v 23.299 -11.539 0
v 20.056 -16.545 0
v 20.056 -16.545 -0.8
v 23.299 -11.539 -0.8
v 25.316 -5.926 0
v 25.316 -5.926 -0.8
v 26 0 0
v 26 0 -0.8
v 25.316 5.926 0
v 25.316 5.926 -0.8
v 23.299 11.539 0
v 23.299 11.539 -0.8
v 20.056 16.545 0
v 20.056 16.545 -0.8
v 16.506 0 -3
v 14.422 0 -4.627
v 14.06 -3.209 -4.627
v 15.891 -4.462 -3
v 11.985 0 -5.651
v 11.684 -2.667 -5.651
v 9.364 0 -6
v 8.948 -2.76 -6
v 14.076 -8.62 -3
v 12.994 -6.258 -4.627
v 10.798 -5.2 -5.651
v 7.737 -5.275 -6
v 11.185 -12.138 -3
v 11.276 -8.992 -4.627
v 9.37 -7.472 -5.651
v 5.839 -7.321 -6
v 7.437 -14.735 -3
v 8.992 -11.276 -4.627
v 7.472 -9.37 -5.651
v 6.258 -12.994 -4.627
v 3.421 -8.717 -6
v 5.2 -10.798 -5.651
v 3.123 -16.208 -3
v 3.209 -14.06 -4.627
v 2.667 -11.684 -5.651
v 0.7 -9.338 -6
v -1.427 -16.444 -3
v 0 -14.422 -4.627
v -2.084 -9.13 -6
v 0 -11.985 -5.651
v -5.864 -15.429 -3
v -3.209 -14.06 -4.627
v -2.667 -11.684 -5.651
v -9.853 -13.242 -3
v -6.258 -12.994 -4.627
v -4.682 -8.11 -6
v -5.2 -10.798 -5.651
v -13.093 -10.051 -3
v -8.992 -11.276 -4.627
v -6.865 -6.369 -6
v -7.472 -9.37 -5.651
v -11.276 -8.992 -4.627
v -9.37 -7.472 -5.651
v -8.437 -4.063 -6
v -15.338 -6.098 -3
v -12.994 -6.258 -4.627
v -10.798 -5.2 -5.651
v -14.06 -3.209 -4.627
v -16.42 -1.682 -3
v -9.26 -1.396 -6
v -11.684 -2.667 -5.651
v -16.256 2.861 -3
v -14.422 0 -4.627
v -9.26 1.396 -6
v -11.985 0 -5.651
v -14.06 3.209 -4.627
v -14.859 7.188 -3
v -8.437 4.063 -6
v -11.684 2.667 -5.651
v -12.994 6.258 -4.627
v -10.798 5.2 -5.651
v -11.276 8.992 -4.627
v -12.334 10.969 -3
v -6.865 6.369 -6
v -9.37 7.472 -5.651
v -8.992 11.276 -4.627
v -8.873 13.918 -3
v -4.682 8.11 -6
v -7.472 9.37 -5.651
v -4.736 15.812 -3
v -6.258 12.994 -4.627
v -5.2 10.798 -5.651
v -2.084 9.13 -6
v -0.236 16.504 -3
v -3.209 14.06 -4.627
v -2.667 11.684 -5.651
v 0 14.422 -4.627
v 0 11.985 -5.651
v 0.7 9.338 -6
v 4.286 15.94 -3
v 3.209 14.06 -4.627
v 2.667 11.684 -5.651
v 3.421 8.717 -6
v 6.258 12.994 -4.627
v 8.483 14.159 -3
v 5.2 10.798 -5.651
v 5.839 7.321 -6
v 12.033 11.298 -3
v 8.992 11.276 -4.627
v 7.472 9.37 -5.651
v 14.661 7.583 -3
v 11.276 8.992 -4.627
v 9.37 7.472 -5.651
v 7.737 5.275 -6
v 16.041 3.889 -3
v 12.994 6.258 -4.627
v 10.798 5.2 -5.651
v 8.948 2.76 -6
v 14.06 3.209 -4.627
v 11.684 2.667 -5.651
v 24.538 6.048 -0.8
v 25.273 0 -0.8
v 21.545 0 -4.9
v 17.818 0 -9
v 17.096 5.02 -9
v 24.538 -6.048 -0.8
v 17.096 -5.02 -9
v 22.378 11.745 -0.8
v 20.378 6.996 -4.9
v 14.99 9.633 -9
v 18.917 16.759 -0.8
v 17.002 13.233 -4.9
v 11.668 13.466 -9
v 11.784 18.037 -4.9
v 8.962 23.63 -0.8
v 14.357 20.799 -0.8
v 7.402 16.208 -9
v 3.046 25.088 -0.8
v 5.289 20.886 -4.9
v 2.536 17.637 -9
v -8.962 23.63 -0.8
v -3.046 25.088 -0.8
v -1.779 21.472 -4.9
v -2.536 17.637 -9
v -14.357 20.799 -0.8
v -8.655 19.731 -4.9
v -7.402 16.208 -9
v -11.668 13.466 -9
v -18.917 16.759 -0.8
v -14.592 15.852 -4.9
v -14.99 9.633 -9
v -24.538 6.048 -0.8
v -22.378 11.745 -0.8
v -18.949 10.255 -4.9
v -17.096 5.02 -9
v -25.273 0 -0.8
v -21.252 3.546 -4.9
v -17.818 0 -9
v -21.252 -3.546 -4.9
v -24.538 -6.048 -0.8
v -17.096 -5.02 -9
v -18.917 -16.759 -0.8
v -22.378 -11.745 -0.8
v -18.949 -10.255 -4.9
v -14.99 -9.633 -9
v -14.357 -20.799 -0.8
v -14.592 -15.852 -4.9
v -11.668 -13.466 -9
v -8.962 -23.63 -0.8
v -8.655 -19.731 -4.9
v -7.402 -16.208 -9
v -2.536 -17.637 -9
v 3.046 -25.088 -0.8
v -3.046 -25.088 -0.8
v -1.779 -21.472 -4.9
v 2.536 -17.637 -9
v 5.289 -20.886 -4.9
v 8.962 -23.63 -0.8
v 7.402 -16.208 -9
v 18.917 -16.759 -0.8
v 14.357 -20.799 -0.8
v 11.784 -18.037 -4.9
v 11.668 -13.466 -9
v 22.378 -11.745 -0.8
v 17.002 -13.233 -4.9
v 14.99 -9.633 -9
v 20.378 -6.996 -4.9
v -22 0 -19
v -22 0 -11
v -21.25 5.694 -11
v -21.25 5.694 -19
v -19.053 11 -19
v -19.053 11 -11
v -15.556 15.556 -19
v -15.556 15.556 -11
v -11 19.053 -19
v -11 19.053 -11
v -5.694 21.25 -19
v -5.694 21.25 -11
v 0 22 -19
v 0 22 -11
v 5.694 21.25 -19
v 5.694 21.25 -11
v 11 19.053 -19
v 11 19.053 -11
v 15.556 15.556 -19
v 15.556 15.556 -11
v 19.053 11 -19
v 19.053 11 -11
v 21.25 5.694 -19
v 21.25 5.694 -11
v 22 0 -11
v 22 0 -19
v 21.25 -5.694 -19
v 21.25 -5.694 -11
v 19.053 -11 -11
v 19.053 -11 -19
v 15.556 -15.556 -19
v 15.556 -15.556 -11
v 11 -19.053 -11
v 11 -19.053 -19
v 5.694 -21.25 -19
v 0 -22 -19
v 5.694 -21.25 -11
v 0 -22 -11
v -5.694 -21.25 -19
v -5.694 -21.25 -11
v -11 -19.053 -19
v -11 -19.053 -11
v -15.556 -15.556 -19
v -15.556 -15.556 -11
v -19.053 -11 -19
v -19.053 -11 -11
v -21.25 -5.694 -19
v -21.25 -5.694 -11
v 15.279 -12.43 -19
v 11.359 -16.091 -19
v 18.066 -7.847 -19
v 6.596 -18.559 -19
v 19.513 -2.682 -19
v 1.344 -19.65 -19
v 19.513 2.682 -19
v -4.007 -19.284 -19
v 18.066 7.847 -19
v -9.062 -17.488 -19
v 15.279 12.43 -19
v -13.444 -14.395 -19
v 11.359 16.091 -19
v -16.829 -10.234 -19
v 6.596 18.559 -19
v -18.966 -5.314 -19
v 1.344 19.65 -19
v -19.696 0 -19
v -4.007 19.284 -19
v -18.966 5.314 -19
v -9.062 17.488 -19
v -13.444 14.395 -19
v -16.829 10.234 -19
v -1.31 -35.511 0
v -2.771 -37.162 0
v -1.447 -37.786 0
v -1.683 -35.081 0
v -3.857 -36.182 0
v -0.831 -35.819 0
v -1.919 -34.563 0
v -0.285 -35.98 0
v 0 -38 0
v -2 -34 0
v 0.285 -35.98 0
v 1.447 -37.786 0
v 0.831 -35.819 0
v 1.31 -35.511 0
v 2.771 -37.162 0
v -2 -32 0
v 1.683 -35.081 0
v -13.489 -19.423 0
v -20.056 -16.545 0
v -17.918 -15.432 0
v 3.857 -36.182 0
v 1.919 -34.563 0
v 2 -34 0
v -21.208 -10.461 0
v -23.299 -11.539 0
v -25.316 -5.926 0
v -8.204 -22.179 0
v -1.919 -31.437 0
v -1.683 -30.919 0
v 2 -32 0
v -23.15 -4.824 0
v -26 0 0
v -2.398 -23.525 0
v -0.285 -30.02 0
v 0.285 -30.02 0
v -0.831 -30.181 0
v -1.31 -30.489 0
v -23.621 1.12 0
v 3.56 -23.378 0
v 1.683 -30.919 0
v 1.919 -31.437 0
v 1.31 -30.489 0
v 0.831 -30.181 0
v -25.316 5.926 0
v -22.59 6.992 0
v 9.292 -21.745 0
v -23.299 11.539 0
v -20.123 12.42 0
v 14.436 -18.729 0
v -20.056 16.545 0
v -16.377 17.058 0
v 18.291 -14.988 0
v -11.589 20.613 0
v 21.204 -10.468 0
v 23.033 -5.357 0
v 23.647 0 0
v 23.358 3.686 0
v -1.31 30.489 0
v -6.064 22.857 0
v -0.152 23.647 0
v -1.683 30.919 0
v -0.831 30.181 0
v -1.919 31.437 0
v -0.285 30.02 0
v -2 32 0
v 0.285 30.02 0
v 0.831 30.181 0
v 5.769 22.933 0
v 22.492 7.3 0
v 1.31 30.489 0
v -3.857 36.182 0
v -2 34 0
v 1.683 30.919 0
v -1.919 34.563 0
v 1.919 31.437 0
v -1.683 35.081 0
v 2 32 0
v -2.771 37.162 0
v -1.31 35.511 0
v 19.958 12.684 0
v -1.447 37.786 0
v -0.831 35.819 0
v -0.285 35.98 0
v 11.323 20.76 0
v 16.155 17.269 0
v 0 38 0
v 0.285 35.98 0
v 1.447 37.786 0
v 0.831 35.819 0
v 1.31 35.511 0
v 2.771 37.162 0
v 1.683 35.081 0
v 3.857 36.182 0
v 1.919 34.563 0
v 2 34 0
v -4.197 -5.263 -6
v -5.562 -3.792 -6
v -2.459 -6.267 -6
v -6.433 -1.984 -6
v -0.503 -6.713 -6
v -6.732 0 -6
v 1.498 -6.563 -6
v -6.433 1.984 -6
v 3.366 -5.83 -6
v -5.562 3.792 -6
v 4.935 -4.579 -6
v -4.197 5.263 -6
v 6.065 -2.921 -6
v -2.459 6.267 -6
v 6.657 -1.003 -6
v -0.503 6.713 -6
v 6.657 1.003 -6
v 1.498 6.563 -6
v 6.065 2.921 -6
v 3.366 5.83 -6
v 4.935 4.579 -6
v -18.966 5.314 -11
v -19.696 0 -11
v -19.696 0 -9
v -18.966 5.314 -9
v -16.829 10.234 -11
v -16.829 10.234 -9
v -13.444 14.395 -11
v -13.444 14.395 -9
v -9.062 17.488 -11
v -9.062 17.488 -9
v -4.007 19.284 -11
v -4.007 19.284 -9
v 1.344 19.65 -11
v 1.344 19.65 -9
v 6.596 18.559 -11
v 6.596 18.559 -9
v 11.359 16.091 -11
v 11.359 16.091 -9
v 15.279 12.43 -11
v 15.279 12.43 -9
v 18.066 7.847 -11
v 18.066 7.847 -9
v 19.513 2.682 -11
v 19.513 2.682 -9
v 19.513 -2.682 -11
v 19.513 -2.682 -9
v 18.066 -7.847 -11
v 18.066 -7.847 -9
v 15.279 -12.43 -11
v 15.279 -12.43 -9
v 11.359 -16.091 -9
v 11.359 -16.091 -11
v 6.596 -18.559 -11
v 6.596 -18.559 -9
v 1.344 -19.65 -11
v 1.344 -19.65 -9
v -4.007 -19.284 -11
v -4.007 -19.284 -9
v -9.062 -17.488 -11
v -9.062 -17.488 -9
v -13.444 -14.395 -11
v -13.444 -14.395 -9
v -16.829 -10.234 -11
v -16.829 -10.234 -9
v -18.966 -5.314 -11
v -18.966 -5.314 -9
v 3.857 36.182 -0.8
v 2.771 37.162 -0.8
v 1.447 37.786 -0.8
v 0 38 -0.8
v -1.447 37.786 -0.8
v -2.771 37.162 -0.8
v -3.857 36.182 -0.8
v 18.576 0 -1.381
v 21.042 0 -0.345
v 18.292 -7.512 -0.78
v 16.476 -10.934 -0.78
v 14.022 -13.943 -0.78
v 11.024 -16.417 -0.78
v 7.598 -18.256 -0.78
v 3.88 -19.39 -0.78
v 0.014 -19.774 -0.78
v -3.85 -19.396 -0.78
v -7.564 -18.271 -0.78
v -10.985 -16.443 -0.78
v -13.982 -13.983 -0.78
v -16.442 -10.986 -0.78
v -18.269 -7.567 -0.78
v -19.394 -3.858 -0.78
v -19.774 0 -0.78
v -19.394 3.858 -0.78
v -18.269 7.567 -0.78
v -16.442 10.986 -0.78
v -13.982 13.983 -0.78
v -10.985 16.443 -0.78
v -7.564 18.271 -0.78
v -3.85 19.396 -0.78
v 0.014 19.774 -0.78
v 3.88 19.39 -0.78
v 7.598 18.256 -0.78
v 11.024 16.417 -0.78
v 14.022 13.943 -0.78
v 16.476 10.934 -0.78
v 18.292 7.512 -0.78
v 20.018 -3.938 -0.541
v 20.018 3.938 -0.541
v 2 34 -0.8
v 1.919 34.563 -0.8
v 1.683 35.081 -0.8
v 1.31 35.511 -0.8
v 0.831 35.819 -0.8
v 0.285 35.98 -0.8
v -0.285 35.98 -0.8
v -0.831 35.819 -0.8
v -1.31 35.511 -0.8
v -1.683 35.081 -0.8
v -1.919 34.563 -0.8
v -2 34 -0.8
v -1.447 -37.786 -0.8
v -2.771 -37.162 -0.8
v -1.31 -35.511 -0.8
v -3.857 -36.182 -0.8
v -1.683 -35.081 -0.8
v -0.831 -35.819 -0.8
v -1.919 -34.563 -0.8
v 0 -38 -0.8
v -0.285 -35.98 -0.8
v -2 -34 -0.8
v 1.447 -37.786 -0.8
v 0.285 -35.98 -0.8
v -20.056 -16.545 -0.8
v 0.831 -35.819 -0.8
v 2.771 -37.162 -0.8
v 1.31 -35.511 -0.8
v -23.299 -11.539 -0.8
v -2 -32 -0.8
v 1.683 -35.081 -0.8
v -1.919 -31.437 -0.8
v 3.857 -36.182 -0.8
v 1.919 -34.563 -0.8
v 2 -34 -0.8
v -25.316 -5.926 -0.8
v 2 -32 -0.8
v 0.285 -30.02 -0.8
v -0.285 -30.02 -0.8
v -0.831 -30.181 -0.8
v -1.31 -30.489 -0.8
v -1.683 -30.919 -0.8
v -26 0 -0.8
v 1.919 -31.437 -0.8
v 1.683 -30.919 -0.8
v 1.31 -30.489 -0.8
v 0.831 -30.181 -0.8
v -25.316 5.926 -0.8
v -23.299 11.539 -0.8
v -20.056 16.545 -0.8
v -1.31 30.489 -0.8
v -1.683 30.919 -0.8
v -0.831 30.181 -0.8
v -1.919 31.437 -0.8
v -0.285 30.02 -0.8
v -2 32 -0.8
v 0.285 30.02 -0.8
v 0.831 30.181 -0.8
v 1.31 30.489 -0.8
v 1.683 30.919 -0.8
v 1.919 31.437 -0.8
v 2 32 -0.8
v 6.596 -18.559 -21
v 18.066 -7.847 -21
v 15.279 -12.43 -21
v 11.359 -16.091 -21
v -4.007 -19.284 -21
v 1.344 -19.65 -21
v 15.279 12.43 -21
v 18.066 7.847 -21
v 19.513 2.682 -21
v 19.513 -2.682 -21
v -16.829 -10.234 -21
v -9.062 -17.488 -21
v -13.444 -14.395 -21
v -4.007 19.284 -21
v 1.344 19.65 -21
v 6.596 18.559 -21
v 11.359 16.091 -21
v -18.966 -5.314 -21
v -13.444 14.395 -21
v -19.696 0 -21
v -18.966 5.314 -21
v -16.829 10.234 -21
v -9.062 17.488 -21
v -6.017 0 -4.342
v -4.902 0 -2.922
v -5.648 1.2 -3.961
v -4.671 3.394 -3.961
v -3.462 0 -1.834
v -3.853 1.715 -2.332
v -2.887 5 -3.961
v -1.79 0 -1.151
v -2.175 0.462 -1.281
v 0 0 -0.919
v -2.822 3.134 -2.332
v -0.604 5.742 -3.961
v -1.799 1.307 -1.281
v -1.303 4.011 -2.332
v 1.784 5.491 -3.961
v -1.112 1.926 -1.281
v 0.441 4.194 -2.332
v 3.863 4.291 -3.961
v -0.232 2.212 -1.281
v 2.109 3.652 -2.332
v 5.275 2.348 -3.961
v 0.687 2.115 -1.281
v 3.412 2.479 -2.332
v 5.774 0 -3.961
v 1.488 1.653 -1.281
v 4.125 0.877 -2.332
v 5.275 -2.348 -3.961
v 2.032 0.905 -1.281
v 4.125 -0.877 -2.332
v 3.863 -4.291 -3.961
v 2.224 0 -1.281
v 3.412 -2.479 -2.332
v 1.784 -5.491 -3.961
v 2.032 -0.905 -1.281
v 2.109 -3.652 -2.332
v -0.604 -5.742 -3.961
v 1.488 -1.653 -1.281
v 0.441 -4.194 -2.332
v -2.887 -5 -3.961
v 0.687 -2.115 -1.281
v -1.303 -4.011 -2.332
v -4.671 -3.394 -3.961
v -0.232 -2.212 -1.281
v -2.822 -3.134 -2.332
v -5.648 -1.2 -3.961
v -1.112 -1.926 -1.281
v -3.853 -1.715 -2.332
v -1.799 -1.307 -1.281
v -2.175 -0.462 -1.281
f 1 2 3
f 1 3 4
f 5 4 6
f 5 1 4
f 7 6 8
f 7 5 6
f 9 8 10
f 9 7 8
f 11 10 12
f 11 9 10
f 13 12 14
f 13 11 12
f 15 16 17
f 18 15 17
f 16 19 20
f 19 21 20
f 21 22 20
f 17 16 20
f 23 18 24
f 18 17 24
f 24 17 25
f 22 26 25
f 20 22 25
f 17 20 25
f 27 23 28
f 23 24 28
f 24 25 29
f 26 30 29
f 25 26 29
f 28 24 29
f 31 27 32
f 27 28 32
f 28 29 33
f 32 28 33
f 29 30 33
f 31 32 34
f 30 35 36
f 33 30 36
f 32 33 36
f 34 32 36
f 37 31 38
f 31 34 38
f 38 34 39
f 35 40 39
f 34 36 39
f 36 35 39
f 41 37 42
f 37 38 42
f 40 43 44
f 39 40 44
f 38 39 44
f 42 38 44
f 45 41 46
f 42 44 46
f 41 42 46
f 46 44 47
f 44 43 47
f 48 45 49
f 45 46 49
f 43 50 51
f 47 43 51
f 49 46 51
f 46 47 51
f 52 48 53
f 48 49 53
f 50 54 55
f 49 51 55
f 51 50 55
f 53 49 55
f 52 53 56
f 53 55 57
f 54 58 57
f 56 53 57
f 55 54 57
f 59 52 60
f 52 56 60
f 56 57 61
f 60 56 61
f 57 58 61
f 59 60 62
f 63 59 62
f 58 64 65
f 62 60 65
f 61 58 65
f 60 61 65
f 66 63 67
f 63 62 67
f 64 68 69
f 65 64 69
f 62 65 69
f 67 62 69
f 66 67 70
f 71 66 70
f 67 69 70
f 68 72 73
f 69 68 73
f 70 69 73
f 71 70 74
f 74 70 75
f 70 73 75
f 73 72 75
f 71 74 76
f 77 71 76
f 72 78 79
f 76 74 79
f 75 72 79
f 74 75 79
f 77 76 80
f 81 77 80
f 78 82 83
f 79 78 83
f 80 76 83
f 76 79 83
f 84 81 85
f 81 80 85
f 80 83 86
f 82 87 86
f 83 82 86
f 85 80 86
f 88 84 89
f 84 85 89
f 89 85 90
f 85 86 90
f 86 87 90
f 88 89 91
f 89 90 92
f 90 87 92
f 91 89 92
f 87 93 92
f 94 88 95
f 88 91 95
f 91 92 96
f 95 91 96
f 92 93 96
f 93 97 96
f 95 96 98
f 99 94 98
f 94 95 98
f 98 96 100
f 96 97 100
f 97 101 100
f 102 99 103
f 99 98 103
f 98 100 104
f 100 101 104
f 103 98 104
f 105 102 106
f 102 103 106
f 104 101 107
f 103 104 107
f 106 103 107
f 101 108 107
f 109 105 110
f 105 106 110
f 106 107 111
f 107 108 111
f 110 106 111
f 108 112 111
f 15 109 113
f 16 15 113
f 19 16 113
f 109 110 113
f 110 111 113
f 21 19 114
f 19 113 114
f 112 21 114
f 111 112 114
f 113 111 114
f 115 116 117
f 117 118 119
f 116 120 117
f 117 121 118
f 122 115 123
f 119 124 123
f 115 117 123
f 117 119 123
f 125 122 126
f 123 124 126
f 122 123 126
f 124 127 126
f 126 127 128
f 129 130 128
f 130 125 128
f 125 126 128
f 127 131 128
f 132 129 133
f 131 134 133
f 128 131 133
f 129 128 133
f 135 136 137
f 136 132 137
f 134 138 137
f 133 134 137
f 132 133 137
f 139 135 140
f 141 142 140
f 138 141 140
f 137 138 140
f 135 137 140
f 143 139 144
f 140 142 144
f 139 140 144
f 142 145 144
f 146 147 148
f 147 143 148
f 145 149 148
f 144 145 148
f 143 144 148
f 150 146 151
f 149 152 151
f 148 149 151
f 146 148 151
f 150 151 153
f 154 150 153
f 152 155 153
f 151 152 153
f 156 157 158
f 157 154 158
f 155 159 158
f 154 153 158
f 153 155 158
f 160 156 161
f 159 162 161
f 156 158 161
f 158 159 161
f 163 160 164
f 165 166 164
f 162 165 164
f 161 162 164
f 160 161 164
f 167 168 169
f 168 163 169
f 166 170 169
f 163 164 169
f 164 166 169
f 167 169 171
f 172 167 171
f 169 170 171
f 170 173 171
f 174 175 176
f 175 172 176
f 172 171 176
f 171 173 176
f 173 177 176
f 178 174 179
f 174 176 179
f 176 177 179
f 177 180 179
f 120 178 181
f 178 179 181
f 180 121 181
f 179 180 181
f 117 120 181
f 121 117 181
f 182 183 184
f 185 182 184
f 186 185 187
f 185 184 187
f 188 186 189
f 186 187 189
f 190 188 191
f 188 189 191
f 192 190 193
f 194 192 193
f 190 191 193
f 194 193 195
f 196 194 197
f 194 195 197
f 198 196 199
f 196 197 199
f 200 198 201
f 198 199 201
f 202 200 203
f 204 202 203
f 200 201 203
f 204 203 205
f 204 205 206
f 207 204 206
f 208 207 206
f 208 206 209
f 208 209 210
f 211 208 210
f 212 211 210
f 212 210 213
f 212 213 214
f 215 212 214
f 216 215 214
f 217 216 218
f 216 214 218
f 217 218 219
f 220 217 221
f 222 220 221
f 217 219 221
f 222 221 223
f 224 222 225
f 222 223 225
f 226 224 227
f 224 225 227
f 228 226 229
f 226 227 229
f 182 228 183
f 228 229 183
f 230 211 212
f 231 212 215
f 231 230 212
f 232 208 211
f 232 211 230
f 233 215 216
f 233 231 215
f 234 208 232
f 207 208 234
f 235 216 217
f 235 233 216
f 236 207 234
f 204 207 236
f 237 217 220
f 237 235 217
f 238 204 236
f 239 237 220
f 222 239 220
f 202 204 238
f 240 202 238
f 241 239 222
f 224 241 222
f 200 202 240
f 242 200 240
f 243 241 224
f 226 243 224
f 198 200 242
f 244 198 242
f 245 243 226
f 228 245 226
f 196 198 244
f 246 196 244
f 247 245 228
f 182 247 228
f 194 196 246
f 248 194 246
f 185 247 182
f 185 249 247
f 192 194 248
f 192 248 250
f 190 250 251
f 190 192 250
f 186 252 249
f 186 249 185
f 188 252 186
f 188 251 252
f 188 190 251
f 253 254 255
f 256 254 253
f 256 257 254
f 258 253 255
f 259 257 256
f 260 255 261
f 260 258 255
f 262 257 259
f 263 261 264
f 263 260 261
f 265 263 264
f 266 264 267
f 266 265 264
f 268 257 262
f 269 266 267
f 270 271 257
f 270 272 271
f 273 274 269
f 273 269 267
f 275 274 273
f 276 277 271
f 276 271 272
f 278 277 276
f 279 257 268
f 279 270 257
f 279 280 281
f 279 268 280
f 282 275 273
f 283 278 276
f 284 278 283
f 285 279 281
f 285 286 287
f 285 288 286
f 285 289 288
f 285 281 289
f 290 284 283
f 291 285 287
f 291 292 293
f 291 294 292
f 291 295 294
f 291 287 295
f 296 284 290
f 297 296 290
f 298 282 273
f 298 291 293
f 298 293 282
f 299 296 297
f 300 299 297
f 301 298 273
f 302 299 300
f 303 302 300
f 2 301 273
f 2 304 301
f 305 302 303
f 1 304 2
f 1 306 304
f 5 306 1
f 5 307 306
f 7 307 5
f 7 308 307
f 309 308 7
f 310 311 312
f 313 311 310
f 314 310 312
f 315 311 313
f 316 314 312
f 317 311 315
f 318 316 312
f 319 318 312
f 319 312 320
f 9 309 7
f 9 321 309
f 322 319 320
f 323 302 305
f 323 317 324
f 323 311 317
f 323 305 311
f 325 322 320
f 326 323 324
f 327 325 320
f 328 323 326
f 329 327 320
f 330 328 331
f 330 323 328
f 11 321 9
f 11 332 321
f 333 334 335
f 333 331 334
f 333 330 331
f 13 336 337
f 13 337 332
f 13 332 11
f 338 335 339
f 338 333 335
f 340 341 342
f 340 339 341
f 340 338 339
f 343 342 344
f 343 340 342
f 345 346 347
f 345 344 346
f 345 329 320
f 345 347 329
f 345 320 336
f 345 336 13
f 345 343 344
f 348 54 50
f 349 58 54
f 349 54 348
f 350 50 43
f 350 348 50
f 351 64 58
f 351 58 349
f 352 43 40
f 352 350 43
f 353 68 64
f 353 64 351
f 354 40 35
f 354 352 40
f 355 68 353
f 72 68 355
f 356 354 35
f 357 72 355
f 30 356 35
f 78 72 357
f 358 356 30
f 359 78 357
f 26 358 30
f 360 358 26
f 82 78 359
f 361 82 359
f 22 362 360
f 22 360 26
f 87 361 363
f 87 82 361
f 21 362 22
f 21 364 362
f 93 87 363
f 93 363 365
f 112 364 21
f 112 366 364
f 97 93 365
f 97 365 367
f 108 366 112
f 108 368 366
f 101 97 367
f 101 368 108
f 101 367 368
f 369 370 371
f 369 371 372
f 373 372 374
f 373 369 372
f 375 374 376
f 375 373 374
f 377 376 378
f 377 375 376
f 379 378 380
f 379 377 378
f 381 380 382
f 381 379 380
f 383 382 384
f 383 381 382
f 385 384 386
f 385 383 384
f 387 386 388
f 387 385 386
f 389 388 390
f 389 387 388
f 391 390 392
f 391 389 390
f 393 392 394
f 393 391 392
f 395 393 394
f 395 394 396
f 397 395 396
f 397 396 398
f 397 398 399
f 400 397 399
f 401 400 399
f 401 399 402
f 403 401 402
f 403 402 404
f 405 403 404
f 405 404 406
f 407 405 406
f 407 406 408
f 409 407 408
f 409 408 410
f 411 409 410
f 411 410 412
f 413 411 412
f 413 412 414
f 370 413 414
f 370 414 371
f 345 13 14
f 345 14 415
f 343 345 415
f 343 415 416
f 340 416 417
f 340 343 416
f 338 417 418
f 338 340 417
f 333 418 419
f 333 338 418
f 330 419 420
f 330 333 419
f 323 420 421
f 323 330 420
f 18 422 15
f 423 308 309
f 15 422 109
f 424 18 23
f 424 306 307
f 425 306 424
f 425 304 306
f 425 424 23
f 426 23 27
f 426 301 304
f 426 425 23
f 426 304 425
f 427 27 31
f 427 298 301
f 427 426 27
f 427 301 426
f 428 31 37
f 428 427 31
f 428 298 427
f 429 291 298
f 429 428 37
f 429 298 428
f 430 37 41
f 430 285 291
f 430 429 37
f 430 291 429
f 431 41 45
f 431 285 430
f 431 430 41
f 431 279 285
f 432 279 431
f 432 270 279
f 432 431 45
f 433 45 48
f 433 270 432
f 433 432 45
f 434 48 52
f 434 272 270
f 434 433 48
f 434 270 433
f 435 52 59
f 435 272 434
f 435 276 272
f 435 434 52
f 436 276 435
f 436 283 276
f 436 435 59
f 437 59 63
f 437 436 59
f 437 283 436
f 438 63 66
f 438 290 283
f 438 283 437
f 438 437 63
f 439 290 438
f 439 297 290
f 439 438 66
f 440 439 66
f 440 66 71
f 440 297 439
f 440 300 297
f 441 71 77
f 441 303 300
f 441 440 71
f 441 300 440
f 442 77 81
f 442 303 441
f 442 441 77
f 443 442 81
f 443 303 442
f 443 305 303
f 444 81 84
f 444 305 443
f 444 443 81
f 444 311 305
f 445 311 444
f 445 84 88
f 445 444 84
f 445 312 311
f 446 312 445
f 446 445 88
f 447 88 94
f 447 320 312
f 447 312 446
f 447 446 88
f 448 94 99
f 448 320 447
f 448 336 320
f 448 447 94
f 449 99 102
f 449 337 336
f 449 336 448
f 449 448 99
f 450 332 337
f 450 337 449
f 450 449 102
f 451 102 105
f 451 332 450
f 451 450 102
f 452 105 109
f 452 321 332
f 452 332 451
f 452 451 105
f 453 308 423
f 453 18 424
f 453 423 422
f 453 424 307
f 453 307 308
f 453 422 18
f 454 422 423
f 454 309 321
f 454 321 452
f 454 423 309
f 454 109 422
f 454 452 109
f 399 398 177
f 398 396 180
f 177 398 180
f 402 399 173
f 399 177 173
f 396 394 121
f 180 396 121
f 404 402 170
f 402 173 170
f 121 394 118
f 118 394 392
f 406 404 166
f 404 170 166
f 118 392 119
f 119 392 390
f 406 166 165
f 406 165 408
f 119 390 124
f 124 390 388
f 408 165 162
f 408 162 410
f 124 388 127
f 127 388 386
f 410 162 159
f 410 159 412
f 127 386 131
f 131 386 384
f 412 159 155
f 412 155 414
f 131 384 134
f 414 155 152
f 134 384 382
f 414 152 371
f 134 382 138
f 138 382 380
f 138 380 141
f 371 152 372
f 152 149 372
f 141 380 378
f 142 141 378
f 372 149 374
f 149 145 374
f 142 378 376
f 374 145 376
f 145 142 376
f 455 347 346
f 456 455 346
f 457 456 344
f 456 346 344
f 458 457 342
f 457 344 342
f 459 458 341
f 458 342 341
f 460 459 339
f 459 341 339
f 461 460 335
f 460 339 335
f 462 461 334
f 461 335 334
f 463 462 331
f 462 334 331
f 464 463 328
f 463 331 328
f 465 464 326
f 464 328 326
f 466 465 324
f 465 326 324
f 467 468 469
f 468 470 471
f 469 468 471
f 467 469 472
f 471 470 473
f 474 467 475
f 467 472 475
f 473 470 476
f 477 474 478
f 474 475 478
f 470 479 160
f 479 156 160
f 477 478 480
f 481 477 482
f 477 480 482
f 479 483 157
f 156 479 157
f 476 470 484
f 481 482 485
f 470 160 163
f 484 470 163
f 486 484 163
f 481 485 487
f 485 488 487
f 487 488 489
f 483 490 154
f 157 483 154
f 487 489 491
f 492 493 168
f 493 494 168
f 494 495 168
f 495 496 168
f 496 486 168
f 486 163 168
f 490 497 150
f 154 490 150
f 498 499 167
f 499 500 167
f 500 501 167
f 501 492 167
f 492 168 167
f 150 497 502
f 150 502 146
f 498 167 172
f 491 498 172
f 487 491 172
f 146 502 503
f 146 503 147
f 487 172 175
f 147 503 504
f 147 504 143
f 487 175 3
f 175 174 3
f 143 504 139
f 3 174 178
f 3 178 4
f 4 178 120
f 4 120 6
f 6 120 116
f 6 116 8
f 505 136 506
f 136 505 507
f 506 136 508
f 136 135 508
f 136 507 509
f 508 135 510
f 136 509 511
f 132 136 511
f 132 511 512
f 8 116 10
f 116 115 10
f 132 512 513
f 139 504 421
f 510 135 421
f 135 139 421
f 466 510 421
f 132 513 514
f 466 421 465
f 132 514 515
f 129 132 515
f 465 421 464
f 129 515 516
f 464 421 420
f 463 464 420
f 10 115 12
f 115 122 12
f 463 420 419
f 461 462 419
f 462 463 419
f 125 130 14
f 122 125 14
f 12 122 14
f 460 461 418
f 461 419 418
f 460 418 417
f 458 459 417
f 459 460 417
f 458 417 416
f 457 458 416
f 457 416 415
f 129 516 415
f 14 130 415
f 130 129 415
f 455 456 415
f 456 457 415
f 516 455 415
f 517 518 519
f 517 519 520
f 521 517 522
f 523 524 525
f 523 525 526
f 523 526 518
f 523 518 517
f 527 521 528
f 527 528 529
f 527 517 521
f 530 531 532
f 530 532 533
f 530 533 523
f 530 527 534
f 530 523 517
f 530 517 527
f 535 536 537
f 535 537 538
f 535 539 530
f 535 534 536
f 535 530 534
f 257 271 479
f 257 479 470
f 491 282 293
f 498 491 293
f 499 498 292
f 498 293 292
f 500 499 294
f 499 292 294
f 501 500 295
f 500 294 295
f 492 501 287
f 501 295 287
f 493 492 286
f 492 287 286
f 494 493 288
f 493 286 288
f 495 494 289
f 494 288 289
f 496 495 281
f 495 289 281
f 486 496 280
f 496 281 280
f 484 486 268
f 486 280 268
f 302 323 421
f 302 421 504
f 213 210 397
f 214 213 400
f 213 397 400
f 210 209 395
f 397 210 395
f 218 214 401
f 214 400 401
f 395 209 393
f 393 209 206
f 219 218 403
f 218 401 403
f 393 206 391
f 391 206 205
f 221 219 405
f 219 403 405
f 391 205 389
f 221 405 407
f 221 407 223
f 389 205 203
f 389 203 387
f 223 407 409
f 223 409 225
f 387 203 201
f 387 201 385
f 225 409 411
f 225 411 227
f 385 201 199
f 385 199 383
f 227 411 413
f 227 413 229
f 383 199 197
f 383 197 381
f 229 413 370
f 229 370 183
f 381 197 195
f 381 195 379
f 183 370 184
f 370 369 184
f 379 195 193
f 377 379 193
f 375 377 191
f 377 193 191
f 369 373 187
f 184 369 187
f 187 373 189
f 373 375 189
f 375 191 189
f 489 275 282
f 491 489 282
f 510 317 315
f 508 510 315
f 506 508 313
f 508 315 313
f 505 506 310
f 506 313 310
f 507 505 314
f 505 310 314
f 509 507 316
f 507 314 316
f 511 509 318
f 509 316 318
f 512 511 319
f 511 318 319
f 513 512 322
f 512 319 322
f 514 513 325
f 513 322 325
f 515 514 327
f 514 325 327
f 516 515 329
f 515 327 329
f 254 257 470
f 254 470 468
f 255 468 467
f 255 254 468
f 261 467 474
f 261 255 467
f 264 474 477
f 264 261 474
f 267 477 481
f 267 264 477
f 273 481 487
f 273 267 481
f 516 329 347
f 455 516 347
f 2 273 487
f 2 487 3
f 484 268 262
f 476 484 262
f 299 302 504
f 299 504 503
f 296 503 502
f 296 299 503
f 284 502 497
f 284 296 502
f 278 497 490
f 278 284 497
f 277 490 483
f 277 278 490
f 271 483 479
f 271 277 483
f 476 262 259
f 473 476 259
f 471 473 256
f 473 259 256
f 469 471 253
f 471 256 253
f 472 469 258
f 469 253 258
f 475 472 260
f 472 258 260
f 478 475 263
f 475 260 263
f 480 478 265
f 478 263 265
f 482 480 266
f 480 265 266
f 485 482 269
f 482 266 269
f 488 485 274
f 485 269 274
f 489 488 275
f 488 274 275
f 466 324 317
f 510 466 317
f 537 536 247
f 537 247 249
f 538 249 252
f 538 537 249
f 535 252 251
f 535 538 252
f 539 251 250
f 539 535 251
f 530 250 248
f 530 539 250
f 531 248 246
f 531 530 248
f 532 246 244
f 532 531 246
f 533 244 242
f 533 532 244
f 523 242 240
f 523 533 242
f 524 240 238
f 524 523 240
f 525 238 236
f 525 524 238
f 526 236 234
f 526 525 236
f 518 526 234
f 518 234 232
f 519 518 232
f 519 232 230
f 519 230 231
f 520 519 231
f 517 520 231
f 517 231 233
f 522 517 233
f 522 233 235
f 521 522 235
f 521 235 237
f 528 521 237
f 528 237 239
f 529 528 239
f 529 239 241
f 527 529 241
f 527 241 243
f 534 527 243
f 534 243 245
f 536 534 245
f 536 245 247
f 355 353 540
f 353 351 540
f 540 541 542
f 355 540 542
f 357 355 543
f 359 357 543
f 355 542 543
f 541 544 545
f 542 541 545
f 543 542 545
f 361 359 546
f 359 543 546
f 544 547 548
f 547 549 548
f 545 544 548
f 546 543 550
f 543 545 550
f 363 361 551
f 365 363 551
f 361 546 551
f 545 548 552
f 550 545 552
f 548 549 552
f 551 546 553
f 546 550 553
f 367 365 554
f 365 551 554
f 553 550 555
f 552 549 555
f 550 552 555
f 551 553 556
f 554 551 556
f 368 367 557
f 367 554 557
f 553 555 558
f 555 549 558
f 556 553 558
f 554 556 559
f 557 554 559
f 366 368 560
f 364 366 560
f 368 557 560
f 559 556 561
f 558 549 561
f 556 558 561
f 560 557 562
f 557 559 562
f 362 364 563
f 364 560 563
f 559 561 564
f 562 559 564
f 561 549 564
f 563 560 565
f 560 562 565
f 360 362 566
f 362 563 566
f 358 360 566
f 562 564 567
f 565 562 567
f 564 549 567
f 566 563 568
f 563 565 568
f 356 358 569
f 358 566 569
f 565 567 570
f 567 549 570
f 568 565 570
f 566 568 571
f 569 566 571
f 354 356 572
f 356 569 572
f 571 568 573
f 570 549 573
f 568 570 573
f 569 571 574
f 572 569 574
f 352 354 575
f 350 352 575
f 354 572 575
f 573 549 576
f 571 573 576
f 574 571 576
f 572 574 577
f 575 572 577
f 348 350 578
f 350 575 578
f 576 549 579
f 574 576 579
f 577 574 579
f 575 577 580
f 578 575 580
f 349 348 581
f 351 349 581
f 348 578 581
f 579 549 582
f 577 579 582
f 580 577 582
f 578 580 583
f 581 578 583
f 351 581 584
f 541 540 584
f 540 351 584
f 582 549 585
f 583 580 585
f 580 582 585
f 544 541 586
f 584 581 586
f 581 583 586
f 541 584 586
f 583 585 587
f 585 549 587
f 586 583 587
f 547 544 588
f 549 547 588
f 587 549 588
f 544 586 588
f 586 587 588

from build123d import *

# Parameters (mm, degrees)
SKETCH_1_R      = 26
SKETCH_2_R      = 16
SHELL_1_T       = -5
FILLET_1_R      = 10
SKETCH_4_R      = 22
EXTRUDE_1_DEPTH = 8
SKETCH_5_R      = 19.696379945
EXTRUDE_2_DEPTH = 12
FILLET_2_R      = 10
SKETCH_6_R      = 23.647308565
EXTRUDE_3_DEPTH = 0.8


with BuildPart() as part:
    # 草图1 → 放样1 section 0
    with BuildSketch(Plane.XY):
        Circle(SKETCH_1_R)
    # 草图2 → 放样1 section 1
    with BuildSketch(Plane.XY.offset(-11)):
        Circle(SKETCH_2_R)
    loft()

    # 抽壳1
    shell_1_openings = [part.faces().sort_by_distance(p)[0] for p in [
        (0, 0, 0),
    ]]
    offset(amount=SHELL_1_T, openings=shell_1_openings, kind=Kind.INTERSECTION)

    # 圆角1
    fillet_1_edges = [part.edges().sort_by_distance(p)[0] for p in [
        (-13.788150569, 0, -6),
    ]]
    fillet(fillet_1_edges, radius=FILLET_1_R)

    # 草图3 → 旋转1 (revolve)
    with BuildSketch(Plane(origin=(0, 0, 0), x_dir=(1, 0, 0), z_dir=(0, 1, 0)), mode=Mode.PRIVATE) as revolve_1_sk:
        with BuildLine():
            Line((0, 6), (6.731942195, 6))
            ThreePointArc((6.731942195, 6), (4.217222472, 2.331539651), (0, 0.91858132))
            Line((0, 0.91858132), (0, 6))
        make_face()
    revolve(revolve_1_sk.sketch.rotate(Axis((0, 0, 7.141645332), (0, 0, -1)), 180), axis=Axis((0, 0, 7.141645332), (0, 0, -1)))

    # 草图4 → 拉伸1 (add)
    with BuildSketch(Plane(origin=(0, 0, -11), x_dir=(-1, 0, 0), z_dir=(0, 0, -1))):
        Circle(SKETCH_4_R)
    extrude(amount=EXTRUDE_1_DEPTH)

    # 草图5 → 拉伸2 (add)
    with BuildSketch(Plane(origin=(0, 0, -21), x_dir=(-1, 0, 0), z_dir=(0, 0, -1))):
        Circle(SKETCH_5_R)
    extrude(amount=-EXTRUDE_2_DEPTH)

    # 圆角2
    fillet_2_edges = [part.edges().sort_by_distance(p)[0] for p in [
        (-19.242696024, 0, 0),
    ]]
    fillet(fillet_2_edges, radius=FILLET_2_R)

    # 草图6 → 拉伸3 (add)
    with BuildSketch(Plane.XY):
        with BuildLine():
            Line((-3.856946079, 36.181818182), (-20.056119612, 16.545454545))
            ThreePointArc((-20.056119612, 16.545454545), (-26, 0), (-20.056119612, -16.545454545))
            Line((-20.056119612, -16.545454545), (-3.856946079, -36.181818182))
            ThreePointArc((-3.856946079, -36.181818182), (0, -38), (3.856946079, -36.181818182))
            Line((3.856946079, -36.181818182), (20.056119612, -16.545454545))
            ThreePointArc((20.056119612, -16.545454545), (26, 0), (20.056119612, 16.545454545))
            Line((20.056119612, 16.545454545), (3.856946079, 36.181818182))
            ThreePointArc((3.856946079, 36.181818182), (0, 38), (-3.856946079, 36.181818182))
        make_face()
        Circle(SKETCH_6_R, mode=Mode.SUBTRACT)
        with BuildLine():
            Line((-2, 34), (-2, 32))
            ThreePointArc((-2, 32), (0, 30), (2, 32))
            Line((2, 32), (2, 34))
            ThreePointArc((2, 34), (0, 36), (-2, 34))
        make_face(mode=Mode.SUBTRACT)
        with BuildLine():
            Line((2, -34), (2, -32))
            ThreePointArc((2, -32), (0, -30), (-2, -32))
            Line((-2, -32), (-2, -34))
            ThreePointArc((-2, -34), (0, -36), (2, -34))
        make_face(mode=Mode.SUBTRACT)
    extrude(amount=-EXTRUDE_3_DEPTH)


solid = part.part
